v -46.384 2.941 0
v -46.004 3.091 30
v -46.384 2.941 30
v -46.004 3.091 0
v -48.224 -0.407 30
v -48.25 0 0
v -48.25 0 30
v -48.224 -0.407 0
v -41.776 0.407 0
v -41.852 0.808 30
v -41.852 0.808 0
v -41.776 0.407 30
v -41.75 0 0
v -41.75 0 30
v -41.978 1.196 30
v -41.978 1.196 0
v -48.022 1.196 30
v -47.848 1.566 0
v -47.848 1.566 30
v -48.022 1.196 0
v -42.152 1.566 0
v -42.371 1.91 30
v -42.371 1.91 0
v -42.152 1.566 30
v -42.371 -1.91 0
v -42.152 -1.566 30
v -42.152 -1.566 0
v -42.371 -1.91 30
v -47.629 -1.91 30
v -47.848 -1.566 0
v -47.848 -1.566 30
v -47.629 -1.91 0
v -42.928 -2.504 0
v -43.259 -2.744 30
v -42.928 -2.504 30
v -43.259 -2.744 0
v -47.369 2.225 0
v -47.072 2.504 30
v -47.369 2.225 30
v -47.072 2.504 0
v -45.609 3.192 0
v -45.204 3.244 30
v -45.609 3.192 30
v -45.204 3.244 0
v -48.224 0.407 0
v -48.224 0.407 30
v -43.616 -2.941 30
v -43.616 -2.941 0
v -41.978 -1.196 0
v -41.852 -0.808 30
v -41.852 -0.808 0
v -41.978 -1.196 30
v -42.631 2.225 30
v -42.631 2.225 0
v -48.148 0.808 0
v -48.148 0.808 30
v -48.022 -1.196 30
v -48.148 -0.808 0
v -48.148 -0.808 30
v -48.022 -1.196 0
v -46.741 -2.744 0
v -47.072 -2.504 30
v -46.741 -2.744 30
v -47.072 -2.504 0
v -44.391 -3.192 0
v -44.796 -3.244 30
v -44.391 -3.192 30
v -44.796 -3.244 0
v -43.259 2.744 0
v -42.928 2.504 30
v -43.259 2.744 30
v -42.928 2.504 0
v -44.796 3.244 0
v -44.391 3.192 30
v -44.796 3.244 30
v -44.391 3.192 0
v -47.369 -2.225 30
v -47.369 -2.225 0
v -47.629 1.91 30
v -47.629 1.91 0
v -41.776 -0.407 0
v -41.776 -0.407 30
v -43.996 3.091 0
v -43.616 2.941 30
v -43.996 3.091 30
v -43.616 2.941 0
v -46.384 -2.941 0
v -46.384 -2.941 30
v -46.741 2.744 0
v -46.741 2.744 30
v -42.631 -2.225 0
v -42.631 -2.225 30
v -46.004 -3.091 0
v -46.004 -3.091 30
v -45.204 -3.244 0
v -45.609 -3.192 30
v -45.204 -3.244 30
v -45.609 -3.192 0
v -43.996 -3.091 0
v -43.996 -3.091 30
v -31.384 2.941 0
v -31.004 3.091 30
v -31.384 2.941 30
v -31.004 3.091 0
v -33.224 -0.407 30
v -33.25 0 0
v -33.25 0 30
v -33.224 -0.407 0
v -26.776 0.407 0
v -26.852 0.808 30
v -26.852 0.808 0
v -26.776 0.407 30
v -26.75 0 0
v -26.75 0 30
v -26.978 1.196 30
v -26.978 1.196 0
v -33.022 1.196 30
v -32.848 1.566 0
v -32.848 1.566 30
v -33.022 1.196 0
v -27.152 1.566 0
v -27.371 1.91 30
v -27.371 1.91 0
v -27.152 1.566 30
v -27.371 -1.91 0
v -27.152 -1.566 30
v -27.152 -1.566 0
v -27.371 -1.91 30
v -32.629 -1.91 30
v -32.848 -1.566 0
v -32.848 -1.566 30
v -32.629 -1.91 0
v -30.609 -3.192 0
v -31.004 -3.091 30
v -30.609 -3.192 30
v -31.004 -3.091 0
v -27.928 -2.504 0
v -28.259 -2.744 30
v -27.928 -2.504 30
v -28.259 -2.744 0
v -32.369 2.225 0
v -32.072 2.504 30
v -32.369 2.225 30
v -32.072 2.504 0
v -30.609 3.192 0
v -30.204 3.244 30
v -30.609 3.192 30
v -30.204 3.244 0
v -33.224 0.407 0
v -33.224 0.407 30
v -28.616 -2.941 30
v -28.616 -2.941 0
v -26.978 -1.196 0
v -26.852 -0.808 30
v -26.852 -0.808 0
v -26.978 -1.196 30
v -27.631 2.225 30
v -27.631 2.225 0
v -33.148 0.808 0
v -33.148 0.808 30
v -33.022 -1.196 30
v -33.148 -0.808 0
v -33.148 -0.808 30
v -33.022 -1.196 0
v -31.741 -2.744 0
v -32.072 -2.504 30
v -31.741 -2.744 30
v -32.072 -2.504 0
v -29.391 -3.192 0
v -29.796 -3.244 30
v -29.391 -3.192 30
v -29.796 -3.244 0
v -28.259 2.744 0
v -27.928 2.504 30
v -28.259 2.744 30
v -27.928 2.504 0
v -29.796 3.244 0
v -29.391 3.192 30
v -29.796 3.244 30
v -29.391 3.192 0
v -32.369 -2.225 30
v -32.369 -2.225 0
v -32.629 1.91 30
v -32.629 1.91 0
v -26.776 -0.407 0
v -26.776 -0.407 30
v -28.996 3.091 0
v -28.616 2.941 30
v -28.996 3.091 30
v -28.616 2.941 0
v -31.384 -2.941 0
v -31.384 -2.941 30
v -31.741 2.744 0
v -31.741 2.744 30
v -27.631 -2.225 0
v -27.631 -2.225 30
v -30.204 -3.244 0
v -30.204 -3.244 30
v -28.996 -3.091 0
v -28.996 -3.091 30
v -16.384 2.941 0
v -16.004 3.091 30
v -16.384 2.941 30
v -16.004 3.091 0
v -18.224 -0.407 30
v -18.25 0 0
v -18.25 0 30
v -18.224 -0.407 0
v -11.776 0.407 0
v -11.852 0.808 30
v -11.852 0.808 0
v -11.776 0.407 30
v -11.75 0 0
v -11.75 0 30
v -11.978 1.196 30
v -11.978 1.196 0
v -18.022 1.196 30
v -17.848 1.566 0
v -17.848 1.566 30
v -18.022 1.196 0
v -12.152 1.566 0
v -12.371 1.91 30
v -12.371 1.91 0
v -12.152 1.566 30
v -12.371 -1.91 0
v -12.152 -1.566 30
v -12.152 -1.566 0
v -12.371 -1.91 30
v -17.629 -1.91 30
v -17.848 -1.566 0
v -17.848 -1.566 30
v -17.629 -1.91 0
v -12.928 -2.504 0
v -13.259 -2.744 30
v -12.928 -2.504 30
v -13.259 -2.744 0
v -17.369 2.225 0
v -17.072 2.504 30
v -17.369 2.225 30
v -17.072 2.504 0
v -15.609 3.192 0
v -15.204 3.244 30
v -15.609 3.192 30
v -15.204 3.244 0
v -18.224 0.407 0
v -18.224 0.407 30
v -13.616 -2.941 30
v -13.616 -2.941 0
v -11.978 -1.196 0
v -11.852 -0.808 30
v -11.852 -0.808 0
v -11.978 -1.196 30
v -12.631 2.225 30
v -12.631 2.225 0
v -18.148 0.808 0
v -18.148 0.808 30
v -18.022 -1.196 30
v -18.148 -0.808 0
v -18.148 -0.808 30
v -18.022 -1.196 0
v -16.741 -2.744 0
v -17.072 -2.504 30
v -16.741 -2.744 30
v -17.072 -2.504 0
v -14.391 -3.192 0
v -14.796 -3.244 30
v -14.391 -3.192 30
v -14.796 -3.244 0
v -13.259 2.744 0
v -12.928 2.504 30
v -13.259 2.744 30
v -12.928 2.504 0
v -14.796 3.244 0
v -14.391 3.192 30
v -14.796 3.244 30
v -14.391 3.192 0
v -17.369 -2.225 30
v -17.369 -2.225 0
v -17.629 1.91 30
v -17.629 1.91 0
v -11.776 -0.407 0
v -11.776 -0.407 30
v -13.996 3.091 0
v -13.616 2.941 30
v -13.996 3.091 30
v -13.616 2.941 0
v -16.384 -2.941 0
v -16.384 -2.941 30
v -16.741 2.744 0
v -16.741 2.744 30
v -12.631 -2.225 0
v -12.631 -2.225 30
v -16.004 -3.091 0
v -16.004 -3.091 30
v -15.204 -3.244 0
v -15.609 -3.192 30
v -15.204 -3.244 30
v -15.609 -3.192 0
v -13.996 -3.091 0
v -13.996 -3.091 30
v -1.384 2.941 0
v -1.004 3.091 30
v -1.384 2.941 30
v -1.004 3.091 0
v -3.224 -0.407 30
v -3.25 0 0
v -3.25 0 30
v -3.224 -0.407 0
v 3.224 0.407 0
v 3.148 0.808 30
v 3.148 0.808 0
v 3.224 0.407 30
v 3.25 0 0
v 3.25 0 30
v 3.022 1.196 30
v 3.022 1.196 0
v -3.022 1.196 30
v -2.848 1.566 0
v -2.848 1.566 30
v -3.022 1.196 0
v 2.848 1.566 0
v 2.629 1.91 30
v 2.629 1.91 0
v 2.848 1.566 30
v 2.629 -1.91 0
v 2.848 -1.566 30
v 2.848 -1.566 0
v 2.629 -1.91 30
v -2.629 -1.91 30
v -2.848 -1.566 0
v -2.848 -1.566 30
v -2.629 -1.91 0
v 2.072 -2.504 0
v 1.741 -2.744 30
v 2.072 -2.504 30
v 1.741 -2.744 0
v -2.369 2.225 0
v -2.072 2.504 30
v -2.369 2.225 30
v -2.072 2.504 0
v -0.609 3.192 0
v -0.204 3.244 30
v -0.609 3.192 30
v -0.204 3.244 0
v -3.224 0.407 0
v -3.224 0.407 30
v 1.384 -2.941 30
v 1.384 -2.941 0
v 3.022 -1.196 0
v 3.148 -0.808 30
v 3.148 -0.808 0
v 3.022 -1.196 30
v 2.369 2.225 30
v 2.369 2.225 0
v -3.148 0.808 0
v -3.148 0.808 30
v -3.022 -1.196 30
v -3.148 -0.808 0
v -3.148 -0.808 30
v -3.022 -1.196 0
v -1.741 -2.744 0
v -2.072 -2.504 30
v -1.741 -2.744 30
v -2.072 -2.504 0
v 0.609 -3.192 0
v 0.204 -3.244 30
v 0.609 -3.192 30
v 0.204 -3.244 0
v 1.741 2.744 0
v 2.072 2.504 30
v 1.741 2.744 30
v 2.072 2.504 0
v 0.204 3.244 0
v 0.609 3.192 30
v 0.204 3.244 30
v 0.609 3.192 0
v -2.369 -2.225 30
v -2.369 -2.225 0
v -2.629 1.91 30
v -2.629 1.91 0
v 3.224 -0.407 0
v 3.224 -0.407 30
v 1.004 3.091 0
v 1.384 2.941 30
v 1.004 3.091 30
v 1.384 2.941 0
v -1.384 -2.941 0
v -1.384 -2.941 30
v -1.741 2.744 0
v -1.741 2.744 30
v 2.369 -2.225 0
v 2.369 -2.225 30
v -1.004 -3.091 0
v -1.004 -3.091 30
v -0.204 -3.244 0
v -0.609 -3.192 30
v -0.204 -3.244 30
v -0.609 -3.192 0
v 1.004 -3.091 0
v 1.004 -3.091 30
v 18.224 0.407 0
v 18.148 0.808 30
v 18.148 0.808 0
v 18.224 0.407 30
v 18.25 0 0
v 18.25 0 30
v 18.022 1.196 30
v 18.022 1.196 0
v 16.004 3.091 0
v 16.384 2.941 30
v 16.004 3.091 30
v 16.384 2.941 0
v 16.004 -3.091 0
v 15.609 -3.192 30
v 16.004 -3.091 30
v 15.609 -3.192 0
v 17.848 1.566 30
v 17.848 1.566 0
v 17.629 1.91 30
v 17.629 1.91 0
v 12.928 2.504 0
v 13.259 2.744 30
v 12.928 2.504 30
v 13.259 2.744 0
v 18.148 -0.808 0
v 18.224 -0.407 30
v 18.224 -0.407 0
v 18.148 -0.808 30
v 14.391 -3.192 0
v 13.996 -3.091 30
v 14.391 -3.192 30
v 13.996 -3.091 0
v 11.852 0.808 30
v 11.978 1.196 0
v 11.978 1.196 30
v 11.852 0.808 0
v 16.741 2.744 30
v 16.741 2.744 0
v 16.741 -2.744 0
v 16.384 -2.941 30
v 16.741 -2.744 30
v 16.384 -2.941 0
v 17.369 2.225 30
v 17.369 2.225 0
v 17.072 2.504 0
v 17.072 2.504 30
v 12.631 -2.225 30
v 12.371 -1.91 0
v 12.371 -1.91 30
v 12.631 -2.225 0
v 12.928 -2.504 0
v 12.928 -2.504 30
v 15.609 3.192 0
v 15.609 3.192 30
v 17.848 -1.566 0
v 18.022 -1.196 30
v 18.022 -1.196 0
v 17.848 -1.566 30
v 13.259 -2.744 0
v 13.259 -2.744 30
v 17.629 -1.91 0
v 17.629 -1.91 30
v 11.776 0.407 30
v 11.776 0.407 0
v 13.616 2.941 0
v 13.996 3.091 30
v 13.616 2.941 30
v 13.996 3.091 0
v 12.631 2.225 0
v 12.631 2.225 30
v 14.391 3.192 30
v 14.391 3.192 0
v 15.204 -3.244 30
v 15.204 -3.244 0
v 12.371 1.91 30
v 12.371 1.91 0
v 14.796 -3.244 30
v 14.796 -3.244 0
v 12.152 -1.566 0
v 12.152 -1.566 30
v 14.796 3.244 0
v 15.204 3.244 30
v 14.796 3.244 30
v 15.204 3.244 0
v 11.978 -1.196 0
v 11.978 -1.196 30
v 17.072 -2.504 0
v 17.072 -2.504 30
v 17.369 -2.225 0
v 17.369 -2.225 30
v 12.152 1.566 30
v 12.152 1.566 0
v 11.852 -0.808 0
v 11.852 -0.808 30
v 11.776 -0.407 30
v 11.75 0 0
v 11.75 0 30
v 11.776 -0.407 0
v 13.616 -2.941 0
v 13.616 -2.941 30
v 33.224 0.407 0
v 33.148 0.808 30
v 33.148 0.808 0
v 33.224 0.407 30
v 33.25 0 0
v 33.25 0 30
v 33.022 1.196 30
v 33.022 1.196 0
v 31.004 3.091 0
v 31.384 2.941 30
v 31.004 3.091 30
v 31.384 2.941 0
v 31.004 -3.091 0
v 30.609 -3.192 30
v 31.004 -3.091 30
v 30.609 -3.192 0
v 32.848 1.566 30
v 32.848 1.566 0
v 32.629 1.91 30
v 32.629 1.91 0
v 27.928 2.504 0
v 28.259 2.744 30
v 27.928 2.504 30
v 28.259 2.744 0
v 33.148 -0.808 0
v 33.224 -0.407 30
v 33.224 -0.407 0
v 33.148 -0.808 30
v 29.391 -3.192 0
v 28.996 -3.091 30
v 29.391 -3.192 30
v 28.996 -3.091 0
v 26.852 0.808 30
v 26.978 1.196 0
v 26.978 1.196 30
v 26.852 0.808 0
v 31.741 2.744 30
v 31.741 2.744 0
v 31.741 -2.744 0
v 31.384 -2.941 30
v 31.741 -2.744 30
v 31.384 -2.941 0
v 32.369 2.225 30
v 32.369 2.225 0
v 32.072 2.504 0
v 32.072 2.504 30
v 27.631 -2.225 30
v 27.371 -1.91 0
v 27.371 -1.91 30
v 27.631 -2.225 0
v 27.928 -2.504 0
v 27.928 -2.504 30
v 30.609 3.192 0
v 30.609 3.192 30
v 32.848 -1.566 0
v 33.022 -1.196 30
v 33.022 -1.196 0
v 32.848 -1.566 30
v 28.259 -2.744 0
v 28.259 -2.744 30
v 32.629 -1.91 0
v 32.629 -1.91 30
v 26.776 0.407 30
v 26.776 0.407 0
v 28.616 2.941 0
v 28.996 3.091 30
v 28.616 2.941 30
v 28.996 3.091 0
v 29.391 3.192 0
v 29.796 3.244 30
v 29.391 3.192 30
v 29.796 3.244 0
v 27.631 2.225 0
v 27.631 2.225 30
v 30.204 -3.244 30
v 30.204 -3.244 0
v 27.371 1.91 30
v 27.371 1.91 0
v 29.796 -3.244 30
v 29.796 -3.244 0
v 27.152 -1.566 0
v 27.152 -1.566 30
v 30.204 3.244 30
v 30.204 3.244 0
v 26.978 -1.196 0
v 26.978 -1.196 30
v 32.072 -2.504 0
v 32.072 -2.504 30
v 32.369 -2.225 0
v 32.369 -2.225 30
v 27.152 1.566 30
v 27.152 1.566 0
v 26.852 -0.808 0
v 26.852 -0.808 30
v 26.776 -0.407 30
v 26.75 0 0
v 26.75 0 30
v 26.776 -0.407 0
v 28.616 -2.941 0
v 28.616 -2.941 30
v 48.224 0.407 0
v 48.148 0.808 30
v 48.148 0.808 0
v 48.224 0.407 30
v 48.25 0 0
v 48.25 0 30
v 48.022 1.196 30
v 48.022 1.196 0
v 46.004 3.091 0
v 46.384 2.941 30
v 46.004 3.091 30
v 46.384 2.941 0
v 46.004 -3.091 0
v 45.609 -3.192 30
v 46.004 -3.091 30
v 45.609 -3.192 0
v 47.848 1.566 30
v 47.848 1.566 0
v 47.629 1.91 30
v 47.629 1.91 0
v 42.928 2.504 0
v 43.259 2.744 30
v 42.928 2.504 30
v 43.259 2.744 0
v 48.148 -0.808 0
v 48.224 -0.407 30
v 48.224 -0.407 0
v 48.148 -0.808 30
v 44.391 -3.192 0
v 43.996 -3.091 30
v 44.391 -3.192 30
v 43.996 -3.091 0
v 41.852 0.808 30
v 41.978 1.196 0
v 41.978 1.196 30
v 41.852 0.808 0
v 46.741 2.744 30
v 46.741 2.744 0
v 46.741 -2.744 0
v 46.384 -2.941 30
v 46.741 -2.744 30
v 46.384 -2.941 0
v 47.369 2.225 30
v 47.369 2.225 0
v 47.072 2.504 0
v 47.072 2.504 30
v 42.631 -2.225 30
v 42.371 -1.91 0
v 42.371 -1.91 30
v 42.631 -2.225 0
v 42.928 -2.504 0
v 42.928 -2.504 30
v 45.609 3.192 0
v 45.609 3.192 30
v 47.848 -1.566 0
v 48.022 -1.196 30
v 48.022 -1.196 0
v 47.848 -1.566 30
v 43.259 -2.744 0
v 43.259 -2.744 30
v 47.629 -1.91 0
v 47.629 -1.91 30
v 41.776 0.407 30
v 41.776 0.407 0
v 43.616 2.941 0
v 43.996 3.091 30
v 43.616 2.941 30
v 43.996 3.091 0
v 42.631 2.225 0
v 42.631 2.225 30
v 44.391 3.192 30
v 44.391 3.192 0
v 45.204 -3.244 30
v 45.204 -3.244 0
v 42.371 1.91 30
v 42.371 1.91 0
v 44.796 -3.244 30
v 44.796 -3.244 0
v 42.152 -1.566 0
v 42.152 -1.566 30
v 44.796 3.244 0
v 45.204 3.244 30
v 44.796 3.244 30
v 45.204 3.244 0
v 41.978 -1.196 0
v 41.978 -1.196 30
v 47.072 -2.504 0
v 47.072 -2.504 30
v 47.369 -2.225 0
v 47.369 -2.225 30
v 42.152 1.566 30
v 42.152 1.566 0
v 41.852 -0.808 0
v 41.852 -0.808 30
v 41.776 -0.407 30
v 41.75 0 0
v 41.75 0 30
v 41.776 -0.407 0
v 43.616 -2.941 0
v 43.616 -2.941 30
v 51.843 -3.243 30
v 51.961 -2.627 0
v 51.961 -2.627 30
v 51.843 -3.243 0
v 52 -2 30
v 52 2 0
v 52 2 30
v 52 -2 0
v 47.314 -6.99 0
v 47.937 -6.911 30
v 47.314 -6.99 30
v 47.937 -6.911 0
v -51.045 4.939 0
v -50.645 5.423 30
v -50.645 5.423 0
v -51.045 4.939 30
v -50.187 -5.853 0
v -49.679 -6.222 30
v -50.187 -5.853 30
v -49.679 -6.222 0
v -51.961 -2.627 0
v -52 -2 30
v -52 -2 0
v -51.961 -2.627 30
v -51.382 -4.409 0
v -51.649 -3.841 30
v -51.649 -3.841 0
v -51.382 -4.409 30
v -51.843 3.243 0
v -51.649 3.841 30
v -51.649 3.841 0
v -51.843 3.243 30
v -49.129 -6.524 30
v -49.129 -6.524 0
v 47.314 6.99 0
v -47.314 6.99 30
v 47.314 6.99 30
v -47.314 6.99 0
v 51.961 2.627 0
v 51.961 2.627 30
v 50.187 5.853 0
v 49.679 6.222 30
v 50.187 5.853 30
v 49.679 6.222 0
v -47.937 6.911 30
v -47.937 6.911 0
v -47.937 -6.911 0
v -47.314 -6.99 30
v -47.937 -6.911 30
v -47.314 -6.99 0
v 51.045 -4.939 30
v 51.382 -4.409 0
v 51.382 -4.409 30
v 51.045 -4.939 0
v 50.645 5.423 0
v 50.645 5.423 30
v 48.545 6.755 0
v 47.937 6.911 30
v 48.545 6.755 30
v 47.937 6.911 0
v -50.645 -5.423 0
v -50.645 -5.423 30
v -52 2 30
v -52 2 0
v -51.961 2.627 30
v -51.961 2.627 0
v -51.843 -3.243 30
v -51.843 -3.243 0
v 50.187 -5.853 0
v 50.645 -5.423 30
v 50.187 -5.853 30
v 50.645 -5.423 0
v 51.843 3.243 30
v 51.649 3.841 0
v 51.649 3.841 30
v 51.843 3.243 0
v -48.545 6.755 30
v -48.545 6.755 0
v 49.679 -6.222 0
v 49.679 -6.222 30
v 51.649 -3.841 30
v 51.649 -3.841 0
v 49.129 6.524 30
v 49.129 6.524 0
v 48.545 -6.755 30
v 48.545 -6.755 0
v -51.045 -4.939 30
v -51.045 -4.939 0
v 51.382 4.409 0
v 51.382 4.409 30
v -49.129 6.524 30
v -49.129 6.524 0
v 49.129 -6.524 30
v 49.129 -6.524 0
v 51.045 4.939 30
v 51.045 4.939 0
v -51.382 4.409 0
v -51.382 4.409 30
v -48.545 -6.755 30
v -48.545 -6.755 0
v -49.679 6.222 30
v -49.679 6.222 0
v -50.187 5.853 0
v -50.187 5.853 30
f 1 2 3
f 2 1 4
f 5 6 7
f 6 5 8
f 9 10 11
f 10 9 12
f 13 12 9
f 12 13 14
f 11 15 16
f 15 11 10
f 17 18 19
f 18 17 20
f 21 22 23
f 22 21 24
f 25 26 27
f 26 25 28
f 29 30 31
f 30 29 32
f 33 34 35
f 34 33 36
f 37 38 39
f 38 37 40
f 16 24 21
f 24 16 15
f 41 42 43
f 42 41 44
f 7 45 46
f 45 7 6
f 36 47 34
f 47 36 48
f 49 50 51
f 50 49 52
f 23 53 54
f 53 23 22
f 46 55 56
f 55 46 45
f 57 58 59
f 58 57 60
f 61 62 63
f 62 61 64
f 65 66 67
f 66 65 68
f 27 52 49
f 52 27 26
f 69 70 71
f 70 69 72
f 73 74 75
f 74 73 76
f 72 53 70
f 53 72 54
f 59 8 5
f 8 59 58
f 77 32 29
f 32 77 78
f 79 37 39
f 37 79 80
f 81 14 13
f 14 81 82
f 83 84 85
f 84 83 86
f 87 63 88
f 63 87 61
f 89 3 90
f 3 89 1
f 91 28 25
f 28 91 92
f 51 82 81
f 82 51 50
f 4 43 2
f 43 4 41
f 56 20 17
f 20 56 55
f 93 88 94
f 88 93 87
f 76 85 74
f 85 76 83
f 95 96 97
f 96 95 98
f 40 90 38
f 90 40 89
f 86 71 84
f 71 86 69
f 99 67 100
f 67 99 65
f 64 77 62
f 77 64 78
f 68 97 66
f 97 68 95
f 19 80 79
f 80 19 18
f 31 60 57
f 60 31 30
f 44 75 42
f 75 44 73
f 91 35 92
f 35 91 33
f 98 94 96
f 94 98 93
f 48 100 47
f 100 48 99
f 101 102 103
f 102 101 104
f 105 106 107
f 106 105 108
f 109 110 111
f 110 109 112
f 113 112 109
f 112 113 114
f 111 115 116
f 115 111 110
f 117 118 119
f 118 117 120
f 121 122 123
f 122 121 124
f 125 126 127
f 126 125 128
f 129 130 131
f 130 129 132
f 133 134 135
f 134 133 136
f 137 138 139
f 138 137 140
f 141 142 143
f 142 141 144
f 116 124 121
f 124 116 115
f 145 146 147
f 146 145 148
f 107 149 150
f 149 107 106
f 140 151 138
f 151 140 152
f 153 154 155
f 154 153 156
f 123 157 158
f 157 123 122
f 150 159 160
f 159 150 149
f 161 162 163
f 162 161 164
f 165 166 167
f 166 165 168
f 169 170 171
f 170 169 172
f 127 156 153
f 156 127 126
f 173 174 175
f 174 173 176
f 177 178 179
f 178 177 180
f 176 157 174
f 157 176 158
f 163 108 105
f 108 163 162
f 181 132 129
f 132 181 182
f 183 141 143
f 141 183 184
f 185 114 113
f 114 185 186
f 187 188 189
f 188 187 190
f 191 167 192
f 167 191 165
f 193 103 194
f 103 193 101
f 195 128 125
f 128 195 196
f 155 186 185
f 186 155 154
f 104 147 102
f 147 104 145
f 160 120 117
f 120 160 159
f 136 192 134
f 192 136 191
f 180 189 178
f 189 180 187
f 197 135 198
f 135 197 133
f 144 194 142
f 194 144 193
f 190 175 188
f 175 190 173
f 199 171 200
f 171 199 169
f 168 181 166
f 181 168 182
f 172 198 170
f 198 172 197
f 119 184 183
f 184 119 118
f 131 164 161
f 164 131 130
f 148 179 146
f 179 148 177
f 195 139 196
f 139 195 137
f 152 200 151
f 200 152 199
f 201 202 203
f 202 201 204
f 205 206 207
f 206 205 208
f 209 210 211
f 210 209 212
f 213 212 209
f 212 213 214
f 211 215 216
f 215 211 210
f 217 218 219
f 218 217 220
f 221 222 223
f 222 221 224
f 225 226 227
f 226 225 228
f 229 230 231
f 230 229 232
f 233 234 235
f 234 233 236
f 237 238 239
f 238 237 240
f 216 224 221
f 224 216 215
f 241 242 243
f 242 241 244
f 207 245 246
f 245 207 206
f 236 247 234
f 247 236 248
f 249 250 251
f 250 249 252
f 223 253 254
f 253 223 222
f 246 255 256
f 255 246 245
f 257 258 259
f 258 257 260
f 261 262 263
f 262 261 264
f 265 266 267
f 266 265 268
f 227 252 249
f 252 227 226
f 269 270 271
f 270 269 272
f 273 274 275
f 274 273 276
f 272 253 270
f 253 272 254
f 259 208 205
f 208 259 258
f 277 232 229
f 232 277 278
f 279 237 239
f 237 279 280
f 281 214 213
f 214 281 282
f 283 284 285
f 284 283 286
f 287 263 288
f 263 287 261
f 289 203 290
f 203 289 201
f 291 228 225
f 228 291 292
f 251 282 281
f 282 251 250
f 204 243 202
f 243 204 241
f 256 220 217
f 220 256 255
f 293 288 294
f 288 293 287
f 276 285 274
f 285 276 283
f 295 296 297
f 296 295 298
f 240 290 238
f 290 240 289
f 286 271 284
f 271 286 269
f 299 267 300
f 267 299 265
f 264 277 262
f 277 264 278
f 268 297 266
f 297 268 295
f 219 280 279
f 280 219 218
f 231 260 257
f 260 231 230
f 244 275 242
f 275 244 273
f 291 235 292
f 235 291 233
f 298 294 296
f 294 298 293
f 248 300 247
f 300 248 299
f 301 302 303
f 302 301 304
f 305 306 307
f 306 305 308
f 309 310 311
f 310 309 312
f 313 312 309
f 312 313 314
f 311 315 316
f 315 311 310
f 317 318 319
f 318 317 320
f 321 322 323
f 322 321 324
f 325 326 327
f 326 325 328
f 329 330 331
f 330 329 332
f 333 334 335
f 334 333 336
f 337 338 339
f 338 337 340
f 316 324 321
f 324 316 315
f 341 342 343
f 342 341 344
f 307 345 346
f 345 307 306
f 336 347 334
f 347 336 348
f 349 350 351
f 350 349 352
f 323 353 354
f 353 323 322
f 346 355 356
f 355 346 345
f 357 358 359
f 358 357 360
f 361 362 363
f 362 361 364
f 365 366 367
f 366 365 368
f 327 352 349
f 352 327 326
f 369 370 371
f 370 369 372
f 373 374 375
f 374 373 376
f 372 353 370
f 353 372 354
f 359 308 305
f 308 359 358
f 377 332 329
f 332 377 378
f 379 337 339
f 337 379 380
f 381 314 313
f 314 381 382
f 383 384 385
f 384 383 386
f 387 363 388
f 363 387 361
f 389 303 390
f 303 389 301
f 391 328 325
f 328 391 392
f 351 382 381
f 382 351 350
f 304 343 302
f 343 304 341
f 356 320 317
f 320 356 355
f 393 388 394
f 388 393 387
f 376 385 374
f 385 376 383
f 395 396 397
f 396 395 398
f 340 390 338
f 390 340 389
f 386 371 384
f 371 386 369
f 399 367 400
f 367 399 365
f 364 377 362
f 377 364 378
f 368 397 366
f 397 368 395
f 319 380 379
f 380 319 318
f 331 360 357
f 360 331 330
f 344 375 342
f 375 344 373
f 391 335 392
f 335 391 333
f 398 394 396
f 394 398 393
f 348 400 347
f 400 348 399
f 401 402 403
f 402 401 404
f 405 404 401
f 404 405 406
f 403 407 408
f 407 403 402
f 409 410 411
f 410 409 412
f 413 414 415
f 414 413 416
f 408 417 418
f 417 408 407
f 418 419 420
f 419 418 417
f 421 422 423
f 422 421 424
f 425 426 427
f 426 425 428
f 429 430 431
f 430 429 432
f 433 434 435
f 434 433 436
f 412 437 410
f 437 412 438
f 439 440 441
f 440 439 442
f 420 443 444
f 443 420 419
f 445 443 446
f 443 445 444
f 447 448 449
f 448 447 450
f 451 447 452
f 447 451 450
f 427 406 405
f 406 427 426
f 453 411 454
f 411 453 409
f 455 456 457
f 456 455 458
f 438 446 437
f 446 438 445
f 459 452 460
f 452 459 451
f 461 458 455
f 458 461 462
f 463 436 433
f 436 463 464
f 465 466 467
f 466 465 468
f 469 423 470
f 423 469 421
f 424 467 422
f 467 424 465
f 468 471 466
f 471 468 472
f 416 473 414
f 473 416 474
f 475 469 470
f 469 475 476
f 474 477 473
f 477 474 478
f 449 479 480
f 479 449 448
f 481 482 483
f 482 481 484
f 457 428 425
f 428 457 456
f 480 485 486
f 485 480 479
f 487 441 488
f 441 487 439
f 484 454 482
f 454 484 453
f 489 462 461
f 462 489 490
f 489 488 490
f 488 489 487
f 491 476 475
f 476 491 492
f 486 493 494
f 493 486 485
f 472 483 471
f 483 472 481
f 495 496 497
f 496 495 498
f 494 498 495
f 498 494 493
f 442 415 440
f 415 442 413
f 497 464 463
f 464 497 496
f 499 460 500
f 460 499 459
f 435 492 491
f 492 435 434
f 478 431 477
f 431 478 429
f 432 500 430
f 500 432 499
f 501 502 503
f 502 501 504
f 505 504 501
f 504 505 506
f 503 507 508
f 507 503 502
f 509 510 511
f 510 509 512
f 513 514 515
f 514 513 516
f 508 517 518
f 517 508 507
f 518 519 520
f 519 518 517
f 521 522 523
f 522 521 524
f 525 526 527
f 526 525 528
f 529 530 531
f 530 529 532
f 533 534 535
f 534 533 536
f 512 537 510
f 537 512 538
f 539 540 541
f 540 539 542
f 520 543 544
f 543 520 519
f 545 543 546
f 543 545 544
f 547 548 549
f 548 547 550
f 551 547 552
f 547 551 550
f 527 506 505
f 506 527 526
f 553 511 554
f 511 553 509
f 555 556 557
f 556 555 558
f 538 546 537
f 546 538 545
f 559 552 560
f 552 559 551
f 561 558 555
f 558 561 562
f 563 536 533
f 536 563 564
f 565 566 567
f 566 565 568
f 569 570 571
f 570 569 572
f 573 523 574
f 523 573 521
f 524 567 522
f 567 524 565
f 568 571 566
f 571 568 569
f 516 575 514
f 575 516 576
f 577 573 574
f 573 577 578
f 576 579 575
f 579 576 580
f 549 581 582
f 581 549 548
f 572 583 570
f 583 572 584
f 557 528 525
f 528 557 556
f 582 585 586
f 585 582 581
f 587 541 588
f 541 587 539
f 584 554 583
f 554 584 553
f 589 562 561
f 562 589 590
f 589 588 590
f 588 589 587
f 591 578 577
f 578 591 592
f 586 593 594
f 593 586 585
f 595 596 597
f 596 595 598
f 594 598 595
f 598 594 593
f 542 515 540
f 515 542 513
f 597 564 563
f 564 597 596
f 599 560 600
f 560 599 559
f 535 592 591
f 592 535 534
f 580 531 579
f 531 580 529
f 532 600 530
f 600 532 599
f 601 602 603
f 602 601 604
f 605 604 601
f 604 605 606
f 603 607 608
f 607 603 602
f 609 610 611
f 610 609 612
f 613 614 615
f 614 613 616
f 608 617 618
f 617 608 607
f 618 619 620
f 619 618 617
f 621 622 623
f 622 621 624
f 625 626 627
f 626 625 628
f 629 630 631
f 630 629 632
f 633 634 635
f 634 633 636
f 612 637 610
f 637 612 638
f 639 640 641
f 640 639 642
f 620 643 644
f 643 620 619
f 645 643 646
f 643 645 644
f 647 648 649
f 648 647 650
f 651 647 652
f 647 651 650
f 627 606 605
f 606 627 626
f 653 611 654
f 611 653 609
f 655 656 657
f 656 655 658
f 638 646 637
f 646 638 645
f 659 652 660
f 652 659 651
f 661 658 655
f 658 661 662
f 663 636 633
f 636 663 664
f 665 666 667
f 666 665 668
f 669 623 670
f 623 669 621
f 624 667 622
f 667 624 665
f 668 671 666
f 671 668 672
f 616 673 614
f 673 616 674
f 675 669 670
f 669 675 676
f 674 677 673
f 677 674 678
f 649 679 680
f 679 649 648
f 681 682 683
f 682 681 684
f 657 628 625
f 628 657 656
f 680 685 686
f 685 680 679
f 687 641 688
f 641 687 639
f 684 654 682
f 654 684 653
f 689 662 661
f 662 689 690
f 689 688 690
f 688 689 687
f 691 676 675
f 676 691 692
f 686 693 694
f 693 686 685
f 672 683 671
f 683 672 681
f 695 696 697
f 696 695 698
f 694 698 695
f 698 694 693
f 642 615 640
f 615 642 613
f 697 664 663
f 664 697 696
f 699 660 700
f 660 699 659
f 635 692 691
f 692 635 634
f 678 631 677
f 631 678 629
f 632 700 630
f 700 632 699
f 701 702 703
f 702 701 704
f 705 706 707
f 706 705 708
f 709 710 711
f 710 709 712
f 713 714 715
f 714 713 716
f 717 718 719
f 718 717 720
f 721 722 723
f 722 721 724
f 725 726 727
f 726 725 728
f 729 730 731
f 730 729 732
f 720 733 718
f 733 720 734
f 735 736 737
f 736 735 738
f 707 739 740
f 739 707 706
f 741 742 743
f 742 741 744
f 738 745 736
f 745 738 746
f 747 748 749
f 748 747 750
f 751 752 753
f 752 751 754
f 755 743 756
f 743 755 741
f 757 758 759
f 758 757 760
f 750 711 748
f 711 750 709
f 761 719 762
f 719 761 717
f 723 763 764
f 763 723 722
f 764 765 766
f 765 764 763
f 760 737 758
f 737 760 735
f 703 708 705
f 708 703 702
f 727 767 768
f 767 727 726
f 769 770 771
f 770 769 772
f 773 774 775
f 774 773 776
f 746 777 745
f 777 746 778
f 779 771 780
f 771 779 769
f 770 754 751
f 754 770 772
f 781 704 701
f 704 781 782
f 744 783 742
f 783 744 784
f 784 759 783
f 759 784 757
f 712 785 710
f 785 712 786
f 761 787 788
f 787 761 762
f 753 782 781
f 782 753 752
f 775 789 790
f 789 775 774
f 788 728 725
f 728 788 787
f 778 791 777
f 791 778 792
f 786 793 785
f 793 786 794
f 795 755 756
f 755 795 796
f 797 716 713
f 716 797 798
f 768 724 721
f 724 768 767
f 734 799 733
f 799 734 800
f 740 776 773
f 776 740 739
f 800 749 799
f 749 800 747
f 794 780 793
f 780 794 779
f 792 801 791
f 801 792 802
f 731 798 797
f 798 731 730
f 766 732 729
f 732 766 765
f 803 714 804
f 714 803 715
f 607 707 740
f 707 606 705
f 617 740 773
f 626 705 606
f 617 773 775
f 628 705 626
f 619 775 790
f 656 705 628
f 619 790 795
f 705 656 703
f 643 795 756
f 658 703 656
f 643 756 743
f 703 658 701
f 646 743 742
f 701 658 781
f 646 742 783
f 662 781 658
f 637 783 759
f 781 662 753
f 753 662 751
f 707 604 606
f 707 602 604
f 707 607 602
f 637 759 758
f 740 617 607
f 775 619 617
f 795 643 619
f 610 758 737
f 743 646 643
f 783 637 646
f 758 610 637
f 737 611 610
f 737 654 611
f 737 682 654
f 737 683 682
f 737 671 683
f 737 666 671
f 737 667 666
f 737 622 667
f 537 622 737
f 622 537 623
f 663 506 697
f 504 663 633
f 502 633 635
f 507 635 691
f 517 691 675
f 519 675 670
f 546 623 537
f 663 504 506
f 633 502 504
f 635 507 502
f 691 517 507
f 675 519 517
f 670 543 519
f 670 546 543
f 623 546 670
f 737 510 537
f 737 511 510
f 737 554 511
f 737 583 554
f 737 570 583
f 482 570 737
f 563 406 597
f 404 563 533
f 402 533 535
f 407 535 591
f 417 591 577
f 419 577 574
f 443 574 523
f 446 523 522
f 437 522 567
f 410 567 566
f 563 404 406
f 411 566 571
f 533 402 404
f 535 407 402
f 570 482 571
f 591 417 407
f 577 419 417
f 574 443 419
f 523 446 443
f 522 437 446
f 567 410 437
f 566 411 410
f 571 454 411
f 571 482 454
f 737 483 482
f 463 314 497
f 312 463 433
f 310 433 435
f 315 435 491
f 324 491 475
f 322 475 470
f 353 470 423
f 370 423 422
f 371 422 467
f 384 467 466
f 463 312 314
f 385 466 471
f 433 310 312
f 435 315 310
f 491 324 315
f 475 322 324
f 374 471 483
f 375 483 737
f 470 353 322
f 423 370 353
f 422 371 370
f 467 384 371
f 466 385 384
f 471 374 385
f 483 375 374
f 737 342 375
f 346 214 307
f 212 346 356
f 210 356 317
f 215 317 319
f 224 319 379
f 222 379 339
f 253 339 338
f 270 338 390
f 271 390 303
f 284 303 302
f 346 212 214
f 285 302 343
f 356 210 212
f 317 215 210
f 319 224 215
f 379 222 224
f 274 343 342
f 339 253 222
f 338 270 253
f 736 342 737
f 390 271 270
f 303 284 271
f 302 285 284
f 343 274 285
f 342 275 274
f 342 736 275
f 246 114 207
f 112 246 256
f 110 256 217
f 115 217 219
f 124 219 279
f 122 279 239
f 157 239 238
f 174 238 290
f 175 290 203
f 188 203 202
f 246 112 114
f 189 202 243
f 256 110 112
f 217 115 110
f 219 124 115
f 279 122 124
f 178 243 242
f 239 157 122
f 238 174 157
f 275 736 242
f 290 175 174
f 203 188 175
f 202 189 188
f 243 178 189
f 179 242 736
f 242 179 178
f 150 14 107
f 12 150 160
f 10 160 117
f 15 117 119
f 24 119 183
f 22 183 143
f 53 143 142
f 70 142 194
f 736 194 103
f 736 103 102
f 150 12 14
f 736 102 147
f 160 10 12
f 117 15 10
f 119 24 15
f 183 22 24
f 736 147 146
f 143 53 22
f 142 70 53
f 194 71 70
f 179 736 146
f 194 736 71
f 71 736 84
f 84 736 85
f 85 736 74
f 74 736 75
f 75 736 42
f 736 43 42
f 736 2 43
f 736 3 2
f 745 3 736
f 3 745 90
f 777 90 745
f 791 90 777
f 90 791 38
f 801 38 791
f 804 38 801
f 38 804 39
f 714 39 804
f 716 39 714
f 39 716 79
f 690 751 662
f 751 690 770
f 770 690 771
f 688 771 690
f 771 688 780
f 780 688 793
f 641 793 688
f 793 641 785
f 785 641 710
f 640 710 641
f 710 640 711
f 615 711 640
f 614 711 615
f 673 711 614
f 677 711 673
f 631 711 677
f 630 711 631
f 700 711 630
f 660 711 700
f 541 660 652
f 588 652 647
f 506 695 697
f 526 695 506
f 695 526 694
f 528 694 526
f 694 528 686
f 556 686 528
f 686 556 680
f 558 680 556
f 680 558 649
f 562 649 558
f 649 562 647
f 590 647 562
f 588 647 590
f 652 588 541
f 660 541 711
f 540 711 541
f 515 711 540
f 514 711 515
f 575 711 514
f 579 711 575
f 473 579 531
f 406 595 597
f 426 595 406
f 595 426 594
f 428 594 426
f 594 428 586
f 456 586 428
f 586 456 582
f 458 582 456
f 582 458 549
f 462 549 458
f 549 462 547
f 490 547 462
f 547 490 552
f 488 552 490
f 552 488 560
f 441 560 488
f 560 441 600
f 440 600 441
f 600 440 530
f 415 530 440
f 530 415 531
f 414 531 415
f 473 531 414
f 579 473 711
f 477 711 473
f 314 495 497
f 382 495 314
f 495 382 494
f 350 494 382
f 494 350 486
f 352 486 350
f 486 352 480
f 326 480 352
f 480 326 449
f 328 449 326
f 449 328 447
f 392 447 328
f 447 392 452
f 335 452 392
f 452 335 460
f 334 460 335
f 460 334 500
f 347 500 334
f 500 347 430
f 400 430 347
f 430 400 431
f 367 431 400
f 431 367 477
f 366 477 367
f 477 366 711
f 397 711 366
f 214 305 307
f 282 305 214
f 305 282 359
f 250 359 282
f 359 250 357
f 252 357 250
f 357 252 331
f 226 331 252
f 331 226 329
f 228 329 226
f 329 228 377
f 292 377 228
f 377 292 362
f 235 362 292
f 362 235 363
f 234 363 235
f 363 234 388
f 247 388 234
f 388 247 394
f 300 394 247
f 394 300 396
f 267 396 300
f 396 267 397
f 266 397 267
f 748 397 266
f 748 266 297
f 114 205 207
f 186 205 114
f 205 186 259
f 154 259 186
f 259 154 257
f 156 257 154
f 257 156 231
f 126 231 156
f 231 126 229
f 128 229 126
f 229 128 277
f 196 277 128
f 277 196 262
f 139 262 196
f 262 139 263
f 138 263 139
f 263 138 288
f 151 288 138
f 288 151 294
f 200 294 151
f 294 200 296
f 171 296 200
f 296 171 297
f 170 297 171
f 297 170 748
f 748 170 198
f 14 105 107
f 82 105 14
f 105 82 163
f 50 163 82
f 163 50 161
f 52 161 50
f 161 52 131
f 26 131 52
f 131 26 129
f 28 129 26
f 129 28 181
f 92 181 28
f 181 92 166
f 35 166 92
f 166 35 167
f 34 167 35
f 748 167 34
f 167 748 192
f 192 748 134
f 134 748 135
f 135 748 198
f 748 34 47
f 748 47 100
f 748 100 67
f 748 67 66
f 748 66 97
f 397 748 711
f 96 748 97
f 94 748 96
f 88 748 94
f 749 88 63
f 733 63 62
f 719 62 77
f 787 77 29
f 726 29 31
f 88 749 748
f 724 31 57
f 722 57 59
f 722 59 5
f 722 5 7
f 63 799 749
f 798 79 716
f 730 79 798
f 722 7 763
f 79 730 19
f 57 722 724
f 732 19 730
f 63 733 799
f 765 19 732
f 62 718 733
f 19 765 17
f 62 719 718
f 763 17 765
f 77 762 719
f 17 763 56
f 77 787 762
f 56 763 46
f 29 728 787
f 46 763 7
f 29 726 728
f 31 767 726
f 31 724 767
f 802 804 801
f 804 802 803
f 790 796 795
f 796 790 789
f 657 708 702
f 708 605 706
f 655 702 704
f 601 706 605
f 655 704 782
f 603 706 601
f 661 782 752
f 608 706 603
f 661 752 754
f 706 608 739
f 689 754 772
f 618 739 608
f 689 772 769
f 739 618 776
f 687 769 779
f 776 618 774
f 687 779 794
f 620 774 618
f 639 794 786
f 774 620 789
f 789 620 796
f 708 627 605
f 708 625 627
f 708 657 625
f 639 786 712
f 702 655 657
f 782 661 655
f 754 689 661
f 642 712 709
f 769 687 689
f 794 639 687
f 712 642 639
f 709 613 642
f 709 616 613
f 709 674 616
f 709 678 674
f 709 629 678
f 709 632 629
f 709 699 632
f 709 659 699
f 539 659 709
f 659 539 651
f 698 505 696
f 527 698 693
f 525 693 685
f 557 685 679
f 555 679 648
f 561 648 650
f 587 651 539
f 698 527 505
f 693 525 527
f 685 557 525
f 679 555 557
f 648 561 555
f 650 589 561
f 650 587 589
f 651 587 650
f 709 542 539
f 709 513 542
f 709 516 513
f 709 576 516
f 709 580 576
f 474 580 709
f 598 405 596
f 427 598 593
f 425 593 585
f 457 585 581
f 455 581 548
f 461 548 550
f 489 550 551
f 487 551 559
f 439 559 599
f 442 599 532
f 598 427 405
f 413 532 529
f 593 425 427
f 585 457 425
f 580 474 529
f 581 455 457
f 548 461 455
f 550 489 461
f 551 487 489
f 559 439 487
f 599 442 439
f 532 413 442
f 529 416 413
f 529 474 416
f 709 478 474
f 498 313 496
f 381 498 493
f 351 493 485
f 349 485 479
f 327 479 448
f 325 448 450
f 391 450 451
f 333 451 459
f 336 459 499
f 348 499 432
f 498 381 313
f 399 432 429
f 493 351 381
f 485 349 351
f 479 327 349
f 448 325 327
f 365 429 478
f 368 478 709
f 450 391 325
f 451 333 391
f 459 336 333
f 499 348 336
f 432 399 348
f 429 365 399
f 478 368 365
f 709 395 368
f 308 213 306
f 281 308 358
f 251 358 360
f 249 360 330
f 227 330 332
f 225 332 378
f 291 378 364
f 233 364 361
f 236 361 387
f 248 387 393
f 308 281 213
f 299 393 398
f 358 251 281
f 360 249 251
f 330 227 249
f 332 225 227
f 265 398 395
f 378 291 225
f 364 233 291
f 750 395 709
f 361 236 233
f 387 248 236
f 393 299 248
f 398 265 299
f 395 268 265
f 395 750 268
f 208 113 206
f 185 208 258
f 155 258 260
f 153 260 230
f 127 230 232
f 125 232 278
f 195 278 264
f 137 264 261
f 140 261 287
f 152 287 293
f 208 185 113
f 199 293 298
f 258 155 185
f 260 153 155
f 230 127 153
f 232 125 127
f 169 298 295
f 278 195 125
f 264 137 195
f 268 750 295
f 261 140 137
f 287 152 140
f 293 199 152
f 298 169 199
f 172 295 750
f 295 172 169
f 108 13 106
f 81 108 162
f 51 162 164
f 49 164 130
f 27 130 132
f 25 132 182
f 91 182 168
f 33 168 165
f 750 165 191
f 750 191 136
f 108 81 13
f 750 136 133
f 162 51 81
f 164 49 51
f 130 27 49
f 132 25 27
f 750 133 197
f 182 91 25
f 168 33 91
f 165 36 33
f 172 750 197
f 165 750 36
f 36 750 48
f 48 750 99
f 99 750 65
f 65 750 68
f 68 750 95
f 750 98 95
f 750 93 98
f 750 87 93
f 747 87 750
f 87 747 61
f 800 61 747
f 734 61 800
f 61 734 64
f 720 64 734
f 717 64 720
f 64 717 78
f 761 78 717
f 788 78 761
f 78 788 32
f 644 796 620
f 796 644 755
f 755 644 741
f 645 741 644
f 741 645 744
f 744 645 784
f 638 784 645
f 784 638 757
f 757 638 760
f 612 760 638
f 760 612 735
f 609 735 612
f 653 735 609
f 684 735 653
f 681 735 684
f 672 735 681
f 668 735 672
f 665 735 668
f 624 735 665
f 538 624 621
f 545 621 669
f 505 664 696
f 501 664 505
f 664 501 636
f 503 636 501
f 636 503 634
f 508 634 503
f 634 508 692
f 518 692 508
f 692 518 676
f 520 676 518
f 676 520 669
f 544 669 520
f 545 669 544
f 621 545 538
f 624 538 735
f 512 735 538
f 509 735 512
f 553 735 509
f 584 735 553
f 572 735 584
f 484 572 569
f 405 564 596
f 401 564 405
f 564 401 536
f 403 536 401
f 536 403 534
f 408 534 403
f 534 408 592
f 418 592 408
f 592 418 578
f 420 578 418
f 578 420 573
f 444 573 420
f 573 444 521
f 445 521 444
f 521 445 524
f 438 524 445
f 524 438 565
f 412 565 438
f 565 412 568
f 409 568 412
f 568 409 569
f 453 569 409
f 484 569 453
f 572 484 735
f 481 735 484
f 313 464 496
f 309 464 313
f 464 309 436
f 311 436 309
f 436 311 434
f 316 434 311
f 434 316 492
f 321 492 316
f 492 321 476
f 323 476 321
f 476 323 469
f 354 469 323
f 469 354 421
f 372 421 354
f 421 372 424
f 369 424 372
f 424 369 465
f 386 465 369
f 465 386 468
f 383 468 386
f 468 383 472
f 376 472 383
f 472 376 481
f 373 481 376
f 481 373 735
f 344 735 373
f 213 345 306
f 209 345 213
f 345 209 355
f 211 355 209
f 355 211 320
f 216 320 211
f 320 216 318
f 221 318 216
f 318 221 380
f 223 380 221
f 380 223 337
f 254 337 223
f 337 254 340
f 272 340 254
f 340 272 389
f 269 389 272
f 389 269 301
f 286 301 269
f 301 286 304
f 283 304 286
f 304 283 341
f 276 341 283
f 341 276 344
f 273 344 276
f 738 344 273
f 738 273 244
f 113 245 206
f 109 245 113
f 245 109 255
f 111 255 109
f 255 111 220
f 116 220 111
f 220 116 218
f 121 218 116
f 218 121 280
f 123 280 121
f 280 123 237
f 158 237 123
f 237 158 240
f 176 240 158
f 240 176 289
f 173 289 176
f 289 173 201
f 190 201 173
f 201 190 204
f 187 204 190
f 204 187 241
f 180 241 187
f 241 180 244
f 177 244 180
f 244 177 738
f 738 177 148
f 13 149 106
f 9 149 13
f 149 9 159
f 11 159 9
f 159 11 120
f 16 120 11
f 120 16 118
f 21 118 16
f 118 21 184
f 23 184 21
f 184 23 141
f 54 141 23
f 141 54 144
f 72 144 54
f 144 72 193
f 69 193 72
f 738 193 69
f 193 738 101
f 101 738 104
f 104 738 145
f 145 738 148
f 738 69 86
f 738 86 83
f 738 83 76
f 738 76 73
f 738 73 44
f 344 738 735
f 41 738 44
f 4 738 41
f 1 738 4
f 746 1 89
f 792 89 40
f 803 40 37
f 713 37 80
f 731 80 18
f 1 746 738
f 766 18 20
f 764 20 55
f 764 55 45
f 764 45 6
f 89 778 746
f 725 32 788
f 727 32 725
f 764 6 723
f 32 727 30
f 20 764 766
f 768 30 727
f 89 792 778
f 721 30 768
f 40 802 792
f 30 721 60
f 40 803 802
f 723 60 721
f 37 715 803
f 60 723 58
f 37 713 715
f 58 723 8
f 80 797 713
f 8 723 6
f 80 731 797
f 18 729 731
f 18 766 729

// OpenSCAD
$fn = 50;


difference() {
	union() {
		hull() {
			translate(v = [-47.0000000000, 2.0000000000, 0]) {
				cylinder(h = 30, r = 5);
			}
			translate(v = [47.0000000000, 2.0000000000, 0]) {
				cylinder(h = 30, r = 5);
			}
			translate(v = [-47.0000000000, -2.0000000000, 0]) {
				cylinder(h = 30, r = 5);
			}
			translate(v = [47.0000000000, -2.0000000000, 0]) {
				cylinder(h = 30, r = 5);
			}
		}
	}
	union() {
		translate(v = [-45.0000000000, 0.0000000000, -100.0000000000]) {
			cylinder(h = 200, r = 3.2500000000);
		}
		translate(v = [-30.0000000000, 0.0000000000, -100.0000000000]) {
			cylinder(h = 200, r = 3.2500000000);
		}
		translate(v = [-15.0000000000, 0.0000000000, -100.0000000000]) {
			cylinder(h = 200, r = 3.2500000000);
		}
		translate(v = [0.0000000000, 0.0000000000, -100.0000000000]) {
			cylinder(h = 200, r = 3.2500000000);
		}
		translate(v = [15.0000000000, 0.0000000000, -100.0000000000]) {
			cylinder(h = 200, r = 3.2500000000);
		}
		translate(v = [30.0000000000, 0.0000000000, -100.0000000000]) {
			cylinder(h = 200, r = 3.2500000000);
		}
		translate(v = [45.0000000000, 0.0000000000, -100.0000000000]) {
			cylinder(h = 200, r = 3.2500000000);
		}
	}
}
